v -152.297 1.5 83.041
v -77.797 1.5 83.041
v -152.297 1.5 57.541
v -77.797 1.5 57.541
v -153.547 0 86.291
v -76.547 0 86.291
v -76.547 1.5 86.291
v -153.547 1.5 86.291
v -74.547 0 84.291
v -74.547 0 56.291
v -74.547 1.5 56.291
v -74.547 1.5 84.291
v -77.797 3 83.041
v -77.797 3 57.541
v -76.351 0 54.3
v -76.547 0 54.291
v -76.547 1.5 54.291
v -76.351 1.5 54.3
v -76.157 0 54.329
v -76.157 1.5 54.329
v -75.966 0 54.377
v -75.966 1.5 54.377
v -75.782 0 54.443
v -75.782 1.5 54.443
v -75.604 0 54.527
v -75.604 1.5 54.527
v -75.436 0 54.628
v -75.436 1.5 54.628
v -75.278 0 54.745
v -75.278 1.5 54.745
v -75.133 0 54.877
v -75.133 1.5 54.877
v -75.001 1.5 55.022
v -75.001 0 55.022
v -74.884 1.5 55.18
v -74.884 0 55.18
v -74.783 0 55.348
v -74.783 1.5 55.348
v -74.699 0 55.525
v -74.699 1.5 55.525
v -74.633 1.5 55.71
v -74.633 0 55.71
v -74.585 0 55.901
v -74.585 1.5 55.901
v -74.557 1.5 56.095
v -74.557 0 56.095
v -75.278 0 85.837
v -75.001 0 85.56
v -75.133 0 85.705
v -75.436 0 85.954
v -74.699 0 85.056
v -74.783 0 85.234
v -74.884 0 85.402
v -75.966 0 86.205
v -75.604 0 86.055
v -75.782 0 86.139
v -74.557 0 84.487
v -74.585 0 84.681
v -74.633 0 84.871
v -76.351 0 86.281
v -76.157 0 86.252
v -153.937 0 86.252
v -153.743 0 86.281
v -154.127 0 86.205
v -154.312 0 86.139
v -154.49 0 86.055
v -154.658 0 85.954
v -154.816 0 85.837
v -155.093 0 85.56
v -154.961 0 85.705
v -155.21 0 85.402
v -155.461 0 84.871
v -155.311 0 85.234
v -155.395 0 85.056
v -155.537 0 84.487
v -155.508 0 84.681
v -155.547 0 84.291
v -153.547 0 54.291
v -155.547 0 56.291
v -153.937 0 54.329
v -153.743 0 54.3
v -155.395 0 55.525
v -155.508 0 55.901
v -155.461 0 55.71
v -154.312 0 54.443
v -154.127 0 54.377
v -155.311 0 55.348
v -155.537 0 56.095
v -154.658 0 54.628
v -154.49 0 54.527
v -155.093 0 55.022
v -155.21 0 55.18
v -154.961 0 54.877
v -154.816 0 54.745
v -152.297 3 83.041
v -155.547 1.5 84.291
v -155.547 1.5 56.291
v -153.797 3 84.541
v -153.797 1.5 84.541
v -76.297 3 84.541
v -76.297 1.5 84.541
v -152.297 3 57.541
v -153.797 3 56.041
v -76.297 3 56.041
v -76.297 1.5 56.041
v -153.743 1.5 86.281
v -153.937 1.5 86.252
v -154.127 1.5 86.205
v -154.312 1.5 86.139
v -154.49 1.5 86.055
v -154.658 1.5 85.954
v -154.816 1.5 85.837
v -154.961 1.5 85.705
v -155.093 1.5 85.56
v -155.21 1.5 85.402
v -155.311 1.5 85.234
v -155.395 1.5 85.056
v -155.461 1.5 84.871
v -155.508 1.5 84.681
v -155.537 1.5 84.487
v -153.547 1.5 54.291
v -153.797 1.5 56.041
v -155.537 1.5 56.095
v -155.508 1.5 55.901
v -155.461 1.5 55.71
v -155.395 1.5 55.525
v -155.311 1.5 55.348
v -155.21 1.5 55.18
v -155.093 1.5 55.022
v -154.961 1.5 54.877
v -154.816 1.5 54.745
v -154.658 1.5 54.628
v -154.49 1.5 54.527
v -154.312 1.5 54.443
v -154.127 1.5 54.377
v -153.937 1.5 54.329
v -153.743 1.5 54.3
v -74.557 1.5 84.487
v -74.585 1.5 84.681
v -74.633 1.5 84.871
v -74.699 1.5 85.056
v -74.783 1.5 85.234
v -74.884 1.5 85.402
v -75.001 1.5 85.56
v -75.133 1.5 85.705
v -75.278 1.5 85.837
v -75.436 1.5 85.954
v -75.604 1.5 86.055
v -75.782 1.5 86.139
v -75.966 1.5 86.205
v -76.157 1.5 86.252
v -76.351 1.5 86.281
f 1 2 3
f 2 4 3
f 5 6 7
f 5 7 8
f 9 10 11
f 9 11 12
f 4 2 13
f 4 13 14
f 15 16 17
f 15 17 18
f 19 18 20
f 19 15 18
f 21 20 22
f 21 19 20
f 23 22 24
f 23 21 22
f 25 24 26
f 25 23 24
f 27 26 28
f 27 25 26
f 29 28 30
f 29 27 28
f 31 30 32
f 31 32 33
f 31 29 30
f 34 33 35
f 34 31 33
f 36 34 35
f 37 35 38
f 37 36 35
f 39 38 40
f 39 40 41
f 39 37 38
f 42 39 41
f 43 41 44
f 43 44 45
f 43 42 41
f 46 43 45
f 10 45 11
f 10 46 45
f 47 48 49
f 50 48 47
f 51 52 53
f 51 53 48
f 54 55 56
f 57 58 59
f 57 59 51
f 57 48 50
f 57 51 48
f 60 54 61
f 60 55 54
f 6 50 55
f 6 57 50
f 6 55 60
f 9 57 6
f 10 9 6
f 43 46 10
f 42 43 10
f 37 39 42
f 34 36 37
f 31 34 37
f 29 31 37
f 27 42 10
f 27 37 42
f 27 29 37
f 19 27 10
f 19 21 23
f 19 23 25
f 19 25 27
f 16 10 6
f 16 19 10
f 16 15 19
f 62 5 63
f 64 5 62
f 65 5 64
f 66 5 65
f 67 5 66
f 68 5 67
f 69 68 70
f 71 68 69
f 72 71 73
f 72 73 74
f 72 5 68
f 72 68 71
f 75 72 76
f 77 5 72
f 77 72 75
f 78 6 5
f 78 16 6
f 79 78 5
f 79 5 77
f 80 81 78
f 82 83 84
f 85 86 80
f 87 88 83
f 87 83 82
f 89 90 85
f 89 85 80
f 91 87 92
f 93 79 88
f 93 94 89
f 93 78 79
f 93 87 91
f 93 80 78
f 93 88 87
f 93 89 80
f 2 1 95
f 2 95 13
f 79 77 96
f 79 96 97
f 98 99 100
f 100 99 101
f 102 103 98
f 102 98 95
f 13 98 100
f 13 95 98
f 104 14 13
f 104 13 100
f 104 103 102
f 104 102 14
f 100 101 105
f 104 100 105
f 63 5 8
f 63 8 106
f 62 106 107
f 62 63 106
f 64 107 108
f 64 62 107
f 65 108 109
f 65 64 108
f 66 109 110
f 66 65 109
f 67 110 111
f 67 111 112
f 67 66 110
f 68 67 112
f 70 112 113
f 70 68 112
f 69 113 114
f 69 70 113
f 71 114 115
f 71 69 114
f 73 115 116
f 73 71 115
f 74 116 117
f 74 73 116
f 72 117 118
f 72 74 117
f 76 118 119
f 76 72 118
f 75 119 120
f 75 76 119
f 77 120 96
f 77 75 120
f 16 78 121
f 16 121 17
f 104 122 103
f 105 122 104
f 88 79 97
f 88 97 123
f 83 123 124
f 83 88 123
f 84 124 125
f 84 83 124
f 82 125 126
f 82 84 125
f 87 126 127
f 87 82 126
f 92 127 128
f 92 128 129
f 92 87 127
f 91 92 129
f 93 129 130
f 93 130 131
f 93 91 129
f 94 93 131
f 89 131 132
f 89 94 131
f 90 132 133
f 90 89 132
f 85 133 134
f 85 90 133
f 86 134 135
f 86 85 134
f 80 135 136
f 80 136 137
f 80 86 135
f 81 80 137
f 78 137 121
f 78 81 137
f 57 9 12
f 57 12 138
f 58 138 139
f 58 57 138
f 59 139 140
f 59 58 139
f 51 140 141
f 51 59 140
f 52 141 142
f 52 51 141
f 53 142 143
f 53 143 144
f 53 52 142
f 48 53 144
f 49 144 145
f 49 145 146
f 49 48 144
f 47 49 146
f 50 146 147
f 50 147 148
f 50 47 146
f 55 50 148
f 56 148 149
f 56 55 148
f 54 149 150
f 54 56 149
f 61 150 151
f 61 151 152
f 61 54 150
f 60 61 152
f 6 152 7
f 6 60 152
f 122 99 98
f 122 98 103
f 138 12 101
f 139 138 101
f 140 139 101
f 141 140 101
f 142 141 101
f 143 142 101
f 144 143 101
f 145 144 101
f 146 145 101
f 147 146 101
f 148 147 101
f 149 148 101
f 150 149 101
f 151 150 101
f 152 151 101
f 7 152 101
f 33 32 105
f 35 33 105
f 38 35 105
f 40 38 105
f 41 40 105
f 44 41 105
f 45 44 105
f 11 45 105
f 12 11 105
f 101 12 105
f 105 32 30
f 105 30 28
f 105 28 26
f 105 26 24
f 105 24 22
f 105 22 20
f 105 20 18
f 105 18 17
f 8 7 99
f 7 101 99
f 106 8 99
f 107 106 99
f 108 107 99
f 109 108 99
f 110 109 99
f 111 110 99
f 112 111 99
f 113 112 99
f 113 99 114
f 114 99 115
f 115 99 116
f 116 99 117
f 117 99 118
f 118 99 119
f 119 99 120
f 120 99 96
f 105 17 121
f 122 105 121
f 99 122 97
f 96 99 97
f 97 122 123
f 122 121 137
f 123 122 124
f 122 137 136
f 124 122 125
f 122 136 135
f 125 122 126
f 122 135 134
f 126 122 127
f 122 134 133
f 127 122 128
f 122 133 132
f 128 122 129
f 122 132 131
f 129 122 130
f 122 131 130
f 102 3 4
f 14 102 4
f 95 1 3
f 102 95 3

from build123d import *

# Parameters (mm, degrees)
BOSS_EXTRUDE1_DEPTH = 1.5
SKETCH2_W           = 77.5
SKETCH2_H           = 28.5
SKETCH2_W_2         = 74.5
SKETCH2_H_2         = 25.5
BOSS_EXTRUDE2_DEPTH = 1.5


with BuildPart() as part:
    # Sketch1 → Boss-Extrude1 (new body)
    with BuildSketch(Plane(origin=(0, 0, 0), x_dir=(1, 0, 0), z_dir=(0, 1, 0))):
        with BuildLine():
            Line((-76.546897521, -86.290788706), (-153.546897521, -86.290788706))
            ThreePointArc((-153.546897521, -86.290788706), (-154.961111084, -85.705002268), (-155.546897521, -84.290788706))
            Line((-155.546897521, -84.290788706), (-155.546897521, -56.290788706))
            ThreePointArc((-155.546897521, -56.290788706), (-154.961111084, -54.876575144), (-153.546897521, -54.290788706))
            Line((-153.546897521, -54.290788706), (-76.546897521, -54.290788706))
            ThreePointArc((-76.546897521, -54.290788706), (-75.132683959, -54.876575144), (-74.546897521, -56.290788706))
            Line((-74.546897521, -56.290788706), (-74.546897521, -84.290788706))
            ThreePointArc((-74.546897521, -84.290788706), (-75.132683959, -85.705002268), (-76.546897521, -86.290788706))
        make_face()
    extrude(amount=BOSS_EXTRUDE1_DEPTH)

    # Sketch2 → Boss-Extrude2 (add)
    with BuildSketch(Plane(origin=(0, 1.5, 0), x_dir=(1, 0, 0), z_dir=(0, 1, 0))):
        with Locations((-115.046897521, -70.290788706)):
            Rectangle(SKETCH2_W, SKETCH2_H)
        with Locations((-115.046897521, -70.290788706)):
            Rectangle(SKETCH2_W_2, SKETCH2_H_2, mode=Mode.SUBTRACT)
    extrude(amount=BOSS_EXTRUDE2_DEPTH)


solid = part.part
